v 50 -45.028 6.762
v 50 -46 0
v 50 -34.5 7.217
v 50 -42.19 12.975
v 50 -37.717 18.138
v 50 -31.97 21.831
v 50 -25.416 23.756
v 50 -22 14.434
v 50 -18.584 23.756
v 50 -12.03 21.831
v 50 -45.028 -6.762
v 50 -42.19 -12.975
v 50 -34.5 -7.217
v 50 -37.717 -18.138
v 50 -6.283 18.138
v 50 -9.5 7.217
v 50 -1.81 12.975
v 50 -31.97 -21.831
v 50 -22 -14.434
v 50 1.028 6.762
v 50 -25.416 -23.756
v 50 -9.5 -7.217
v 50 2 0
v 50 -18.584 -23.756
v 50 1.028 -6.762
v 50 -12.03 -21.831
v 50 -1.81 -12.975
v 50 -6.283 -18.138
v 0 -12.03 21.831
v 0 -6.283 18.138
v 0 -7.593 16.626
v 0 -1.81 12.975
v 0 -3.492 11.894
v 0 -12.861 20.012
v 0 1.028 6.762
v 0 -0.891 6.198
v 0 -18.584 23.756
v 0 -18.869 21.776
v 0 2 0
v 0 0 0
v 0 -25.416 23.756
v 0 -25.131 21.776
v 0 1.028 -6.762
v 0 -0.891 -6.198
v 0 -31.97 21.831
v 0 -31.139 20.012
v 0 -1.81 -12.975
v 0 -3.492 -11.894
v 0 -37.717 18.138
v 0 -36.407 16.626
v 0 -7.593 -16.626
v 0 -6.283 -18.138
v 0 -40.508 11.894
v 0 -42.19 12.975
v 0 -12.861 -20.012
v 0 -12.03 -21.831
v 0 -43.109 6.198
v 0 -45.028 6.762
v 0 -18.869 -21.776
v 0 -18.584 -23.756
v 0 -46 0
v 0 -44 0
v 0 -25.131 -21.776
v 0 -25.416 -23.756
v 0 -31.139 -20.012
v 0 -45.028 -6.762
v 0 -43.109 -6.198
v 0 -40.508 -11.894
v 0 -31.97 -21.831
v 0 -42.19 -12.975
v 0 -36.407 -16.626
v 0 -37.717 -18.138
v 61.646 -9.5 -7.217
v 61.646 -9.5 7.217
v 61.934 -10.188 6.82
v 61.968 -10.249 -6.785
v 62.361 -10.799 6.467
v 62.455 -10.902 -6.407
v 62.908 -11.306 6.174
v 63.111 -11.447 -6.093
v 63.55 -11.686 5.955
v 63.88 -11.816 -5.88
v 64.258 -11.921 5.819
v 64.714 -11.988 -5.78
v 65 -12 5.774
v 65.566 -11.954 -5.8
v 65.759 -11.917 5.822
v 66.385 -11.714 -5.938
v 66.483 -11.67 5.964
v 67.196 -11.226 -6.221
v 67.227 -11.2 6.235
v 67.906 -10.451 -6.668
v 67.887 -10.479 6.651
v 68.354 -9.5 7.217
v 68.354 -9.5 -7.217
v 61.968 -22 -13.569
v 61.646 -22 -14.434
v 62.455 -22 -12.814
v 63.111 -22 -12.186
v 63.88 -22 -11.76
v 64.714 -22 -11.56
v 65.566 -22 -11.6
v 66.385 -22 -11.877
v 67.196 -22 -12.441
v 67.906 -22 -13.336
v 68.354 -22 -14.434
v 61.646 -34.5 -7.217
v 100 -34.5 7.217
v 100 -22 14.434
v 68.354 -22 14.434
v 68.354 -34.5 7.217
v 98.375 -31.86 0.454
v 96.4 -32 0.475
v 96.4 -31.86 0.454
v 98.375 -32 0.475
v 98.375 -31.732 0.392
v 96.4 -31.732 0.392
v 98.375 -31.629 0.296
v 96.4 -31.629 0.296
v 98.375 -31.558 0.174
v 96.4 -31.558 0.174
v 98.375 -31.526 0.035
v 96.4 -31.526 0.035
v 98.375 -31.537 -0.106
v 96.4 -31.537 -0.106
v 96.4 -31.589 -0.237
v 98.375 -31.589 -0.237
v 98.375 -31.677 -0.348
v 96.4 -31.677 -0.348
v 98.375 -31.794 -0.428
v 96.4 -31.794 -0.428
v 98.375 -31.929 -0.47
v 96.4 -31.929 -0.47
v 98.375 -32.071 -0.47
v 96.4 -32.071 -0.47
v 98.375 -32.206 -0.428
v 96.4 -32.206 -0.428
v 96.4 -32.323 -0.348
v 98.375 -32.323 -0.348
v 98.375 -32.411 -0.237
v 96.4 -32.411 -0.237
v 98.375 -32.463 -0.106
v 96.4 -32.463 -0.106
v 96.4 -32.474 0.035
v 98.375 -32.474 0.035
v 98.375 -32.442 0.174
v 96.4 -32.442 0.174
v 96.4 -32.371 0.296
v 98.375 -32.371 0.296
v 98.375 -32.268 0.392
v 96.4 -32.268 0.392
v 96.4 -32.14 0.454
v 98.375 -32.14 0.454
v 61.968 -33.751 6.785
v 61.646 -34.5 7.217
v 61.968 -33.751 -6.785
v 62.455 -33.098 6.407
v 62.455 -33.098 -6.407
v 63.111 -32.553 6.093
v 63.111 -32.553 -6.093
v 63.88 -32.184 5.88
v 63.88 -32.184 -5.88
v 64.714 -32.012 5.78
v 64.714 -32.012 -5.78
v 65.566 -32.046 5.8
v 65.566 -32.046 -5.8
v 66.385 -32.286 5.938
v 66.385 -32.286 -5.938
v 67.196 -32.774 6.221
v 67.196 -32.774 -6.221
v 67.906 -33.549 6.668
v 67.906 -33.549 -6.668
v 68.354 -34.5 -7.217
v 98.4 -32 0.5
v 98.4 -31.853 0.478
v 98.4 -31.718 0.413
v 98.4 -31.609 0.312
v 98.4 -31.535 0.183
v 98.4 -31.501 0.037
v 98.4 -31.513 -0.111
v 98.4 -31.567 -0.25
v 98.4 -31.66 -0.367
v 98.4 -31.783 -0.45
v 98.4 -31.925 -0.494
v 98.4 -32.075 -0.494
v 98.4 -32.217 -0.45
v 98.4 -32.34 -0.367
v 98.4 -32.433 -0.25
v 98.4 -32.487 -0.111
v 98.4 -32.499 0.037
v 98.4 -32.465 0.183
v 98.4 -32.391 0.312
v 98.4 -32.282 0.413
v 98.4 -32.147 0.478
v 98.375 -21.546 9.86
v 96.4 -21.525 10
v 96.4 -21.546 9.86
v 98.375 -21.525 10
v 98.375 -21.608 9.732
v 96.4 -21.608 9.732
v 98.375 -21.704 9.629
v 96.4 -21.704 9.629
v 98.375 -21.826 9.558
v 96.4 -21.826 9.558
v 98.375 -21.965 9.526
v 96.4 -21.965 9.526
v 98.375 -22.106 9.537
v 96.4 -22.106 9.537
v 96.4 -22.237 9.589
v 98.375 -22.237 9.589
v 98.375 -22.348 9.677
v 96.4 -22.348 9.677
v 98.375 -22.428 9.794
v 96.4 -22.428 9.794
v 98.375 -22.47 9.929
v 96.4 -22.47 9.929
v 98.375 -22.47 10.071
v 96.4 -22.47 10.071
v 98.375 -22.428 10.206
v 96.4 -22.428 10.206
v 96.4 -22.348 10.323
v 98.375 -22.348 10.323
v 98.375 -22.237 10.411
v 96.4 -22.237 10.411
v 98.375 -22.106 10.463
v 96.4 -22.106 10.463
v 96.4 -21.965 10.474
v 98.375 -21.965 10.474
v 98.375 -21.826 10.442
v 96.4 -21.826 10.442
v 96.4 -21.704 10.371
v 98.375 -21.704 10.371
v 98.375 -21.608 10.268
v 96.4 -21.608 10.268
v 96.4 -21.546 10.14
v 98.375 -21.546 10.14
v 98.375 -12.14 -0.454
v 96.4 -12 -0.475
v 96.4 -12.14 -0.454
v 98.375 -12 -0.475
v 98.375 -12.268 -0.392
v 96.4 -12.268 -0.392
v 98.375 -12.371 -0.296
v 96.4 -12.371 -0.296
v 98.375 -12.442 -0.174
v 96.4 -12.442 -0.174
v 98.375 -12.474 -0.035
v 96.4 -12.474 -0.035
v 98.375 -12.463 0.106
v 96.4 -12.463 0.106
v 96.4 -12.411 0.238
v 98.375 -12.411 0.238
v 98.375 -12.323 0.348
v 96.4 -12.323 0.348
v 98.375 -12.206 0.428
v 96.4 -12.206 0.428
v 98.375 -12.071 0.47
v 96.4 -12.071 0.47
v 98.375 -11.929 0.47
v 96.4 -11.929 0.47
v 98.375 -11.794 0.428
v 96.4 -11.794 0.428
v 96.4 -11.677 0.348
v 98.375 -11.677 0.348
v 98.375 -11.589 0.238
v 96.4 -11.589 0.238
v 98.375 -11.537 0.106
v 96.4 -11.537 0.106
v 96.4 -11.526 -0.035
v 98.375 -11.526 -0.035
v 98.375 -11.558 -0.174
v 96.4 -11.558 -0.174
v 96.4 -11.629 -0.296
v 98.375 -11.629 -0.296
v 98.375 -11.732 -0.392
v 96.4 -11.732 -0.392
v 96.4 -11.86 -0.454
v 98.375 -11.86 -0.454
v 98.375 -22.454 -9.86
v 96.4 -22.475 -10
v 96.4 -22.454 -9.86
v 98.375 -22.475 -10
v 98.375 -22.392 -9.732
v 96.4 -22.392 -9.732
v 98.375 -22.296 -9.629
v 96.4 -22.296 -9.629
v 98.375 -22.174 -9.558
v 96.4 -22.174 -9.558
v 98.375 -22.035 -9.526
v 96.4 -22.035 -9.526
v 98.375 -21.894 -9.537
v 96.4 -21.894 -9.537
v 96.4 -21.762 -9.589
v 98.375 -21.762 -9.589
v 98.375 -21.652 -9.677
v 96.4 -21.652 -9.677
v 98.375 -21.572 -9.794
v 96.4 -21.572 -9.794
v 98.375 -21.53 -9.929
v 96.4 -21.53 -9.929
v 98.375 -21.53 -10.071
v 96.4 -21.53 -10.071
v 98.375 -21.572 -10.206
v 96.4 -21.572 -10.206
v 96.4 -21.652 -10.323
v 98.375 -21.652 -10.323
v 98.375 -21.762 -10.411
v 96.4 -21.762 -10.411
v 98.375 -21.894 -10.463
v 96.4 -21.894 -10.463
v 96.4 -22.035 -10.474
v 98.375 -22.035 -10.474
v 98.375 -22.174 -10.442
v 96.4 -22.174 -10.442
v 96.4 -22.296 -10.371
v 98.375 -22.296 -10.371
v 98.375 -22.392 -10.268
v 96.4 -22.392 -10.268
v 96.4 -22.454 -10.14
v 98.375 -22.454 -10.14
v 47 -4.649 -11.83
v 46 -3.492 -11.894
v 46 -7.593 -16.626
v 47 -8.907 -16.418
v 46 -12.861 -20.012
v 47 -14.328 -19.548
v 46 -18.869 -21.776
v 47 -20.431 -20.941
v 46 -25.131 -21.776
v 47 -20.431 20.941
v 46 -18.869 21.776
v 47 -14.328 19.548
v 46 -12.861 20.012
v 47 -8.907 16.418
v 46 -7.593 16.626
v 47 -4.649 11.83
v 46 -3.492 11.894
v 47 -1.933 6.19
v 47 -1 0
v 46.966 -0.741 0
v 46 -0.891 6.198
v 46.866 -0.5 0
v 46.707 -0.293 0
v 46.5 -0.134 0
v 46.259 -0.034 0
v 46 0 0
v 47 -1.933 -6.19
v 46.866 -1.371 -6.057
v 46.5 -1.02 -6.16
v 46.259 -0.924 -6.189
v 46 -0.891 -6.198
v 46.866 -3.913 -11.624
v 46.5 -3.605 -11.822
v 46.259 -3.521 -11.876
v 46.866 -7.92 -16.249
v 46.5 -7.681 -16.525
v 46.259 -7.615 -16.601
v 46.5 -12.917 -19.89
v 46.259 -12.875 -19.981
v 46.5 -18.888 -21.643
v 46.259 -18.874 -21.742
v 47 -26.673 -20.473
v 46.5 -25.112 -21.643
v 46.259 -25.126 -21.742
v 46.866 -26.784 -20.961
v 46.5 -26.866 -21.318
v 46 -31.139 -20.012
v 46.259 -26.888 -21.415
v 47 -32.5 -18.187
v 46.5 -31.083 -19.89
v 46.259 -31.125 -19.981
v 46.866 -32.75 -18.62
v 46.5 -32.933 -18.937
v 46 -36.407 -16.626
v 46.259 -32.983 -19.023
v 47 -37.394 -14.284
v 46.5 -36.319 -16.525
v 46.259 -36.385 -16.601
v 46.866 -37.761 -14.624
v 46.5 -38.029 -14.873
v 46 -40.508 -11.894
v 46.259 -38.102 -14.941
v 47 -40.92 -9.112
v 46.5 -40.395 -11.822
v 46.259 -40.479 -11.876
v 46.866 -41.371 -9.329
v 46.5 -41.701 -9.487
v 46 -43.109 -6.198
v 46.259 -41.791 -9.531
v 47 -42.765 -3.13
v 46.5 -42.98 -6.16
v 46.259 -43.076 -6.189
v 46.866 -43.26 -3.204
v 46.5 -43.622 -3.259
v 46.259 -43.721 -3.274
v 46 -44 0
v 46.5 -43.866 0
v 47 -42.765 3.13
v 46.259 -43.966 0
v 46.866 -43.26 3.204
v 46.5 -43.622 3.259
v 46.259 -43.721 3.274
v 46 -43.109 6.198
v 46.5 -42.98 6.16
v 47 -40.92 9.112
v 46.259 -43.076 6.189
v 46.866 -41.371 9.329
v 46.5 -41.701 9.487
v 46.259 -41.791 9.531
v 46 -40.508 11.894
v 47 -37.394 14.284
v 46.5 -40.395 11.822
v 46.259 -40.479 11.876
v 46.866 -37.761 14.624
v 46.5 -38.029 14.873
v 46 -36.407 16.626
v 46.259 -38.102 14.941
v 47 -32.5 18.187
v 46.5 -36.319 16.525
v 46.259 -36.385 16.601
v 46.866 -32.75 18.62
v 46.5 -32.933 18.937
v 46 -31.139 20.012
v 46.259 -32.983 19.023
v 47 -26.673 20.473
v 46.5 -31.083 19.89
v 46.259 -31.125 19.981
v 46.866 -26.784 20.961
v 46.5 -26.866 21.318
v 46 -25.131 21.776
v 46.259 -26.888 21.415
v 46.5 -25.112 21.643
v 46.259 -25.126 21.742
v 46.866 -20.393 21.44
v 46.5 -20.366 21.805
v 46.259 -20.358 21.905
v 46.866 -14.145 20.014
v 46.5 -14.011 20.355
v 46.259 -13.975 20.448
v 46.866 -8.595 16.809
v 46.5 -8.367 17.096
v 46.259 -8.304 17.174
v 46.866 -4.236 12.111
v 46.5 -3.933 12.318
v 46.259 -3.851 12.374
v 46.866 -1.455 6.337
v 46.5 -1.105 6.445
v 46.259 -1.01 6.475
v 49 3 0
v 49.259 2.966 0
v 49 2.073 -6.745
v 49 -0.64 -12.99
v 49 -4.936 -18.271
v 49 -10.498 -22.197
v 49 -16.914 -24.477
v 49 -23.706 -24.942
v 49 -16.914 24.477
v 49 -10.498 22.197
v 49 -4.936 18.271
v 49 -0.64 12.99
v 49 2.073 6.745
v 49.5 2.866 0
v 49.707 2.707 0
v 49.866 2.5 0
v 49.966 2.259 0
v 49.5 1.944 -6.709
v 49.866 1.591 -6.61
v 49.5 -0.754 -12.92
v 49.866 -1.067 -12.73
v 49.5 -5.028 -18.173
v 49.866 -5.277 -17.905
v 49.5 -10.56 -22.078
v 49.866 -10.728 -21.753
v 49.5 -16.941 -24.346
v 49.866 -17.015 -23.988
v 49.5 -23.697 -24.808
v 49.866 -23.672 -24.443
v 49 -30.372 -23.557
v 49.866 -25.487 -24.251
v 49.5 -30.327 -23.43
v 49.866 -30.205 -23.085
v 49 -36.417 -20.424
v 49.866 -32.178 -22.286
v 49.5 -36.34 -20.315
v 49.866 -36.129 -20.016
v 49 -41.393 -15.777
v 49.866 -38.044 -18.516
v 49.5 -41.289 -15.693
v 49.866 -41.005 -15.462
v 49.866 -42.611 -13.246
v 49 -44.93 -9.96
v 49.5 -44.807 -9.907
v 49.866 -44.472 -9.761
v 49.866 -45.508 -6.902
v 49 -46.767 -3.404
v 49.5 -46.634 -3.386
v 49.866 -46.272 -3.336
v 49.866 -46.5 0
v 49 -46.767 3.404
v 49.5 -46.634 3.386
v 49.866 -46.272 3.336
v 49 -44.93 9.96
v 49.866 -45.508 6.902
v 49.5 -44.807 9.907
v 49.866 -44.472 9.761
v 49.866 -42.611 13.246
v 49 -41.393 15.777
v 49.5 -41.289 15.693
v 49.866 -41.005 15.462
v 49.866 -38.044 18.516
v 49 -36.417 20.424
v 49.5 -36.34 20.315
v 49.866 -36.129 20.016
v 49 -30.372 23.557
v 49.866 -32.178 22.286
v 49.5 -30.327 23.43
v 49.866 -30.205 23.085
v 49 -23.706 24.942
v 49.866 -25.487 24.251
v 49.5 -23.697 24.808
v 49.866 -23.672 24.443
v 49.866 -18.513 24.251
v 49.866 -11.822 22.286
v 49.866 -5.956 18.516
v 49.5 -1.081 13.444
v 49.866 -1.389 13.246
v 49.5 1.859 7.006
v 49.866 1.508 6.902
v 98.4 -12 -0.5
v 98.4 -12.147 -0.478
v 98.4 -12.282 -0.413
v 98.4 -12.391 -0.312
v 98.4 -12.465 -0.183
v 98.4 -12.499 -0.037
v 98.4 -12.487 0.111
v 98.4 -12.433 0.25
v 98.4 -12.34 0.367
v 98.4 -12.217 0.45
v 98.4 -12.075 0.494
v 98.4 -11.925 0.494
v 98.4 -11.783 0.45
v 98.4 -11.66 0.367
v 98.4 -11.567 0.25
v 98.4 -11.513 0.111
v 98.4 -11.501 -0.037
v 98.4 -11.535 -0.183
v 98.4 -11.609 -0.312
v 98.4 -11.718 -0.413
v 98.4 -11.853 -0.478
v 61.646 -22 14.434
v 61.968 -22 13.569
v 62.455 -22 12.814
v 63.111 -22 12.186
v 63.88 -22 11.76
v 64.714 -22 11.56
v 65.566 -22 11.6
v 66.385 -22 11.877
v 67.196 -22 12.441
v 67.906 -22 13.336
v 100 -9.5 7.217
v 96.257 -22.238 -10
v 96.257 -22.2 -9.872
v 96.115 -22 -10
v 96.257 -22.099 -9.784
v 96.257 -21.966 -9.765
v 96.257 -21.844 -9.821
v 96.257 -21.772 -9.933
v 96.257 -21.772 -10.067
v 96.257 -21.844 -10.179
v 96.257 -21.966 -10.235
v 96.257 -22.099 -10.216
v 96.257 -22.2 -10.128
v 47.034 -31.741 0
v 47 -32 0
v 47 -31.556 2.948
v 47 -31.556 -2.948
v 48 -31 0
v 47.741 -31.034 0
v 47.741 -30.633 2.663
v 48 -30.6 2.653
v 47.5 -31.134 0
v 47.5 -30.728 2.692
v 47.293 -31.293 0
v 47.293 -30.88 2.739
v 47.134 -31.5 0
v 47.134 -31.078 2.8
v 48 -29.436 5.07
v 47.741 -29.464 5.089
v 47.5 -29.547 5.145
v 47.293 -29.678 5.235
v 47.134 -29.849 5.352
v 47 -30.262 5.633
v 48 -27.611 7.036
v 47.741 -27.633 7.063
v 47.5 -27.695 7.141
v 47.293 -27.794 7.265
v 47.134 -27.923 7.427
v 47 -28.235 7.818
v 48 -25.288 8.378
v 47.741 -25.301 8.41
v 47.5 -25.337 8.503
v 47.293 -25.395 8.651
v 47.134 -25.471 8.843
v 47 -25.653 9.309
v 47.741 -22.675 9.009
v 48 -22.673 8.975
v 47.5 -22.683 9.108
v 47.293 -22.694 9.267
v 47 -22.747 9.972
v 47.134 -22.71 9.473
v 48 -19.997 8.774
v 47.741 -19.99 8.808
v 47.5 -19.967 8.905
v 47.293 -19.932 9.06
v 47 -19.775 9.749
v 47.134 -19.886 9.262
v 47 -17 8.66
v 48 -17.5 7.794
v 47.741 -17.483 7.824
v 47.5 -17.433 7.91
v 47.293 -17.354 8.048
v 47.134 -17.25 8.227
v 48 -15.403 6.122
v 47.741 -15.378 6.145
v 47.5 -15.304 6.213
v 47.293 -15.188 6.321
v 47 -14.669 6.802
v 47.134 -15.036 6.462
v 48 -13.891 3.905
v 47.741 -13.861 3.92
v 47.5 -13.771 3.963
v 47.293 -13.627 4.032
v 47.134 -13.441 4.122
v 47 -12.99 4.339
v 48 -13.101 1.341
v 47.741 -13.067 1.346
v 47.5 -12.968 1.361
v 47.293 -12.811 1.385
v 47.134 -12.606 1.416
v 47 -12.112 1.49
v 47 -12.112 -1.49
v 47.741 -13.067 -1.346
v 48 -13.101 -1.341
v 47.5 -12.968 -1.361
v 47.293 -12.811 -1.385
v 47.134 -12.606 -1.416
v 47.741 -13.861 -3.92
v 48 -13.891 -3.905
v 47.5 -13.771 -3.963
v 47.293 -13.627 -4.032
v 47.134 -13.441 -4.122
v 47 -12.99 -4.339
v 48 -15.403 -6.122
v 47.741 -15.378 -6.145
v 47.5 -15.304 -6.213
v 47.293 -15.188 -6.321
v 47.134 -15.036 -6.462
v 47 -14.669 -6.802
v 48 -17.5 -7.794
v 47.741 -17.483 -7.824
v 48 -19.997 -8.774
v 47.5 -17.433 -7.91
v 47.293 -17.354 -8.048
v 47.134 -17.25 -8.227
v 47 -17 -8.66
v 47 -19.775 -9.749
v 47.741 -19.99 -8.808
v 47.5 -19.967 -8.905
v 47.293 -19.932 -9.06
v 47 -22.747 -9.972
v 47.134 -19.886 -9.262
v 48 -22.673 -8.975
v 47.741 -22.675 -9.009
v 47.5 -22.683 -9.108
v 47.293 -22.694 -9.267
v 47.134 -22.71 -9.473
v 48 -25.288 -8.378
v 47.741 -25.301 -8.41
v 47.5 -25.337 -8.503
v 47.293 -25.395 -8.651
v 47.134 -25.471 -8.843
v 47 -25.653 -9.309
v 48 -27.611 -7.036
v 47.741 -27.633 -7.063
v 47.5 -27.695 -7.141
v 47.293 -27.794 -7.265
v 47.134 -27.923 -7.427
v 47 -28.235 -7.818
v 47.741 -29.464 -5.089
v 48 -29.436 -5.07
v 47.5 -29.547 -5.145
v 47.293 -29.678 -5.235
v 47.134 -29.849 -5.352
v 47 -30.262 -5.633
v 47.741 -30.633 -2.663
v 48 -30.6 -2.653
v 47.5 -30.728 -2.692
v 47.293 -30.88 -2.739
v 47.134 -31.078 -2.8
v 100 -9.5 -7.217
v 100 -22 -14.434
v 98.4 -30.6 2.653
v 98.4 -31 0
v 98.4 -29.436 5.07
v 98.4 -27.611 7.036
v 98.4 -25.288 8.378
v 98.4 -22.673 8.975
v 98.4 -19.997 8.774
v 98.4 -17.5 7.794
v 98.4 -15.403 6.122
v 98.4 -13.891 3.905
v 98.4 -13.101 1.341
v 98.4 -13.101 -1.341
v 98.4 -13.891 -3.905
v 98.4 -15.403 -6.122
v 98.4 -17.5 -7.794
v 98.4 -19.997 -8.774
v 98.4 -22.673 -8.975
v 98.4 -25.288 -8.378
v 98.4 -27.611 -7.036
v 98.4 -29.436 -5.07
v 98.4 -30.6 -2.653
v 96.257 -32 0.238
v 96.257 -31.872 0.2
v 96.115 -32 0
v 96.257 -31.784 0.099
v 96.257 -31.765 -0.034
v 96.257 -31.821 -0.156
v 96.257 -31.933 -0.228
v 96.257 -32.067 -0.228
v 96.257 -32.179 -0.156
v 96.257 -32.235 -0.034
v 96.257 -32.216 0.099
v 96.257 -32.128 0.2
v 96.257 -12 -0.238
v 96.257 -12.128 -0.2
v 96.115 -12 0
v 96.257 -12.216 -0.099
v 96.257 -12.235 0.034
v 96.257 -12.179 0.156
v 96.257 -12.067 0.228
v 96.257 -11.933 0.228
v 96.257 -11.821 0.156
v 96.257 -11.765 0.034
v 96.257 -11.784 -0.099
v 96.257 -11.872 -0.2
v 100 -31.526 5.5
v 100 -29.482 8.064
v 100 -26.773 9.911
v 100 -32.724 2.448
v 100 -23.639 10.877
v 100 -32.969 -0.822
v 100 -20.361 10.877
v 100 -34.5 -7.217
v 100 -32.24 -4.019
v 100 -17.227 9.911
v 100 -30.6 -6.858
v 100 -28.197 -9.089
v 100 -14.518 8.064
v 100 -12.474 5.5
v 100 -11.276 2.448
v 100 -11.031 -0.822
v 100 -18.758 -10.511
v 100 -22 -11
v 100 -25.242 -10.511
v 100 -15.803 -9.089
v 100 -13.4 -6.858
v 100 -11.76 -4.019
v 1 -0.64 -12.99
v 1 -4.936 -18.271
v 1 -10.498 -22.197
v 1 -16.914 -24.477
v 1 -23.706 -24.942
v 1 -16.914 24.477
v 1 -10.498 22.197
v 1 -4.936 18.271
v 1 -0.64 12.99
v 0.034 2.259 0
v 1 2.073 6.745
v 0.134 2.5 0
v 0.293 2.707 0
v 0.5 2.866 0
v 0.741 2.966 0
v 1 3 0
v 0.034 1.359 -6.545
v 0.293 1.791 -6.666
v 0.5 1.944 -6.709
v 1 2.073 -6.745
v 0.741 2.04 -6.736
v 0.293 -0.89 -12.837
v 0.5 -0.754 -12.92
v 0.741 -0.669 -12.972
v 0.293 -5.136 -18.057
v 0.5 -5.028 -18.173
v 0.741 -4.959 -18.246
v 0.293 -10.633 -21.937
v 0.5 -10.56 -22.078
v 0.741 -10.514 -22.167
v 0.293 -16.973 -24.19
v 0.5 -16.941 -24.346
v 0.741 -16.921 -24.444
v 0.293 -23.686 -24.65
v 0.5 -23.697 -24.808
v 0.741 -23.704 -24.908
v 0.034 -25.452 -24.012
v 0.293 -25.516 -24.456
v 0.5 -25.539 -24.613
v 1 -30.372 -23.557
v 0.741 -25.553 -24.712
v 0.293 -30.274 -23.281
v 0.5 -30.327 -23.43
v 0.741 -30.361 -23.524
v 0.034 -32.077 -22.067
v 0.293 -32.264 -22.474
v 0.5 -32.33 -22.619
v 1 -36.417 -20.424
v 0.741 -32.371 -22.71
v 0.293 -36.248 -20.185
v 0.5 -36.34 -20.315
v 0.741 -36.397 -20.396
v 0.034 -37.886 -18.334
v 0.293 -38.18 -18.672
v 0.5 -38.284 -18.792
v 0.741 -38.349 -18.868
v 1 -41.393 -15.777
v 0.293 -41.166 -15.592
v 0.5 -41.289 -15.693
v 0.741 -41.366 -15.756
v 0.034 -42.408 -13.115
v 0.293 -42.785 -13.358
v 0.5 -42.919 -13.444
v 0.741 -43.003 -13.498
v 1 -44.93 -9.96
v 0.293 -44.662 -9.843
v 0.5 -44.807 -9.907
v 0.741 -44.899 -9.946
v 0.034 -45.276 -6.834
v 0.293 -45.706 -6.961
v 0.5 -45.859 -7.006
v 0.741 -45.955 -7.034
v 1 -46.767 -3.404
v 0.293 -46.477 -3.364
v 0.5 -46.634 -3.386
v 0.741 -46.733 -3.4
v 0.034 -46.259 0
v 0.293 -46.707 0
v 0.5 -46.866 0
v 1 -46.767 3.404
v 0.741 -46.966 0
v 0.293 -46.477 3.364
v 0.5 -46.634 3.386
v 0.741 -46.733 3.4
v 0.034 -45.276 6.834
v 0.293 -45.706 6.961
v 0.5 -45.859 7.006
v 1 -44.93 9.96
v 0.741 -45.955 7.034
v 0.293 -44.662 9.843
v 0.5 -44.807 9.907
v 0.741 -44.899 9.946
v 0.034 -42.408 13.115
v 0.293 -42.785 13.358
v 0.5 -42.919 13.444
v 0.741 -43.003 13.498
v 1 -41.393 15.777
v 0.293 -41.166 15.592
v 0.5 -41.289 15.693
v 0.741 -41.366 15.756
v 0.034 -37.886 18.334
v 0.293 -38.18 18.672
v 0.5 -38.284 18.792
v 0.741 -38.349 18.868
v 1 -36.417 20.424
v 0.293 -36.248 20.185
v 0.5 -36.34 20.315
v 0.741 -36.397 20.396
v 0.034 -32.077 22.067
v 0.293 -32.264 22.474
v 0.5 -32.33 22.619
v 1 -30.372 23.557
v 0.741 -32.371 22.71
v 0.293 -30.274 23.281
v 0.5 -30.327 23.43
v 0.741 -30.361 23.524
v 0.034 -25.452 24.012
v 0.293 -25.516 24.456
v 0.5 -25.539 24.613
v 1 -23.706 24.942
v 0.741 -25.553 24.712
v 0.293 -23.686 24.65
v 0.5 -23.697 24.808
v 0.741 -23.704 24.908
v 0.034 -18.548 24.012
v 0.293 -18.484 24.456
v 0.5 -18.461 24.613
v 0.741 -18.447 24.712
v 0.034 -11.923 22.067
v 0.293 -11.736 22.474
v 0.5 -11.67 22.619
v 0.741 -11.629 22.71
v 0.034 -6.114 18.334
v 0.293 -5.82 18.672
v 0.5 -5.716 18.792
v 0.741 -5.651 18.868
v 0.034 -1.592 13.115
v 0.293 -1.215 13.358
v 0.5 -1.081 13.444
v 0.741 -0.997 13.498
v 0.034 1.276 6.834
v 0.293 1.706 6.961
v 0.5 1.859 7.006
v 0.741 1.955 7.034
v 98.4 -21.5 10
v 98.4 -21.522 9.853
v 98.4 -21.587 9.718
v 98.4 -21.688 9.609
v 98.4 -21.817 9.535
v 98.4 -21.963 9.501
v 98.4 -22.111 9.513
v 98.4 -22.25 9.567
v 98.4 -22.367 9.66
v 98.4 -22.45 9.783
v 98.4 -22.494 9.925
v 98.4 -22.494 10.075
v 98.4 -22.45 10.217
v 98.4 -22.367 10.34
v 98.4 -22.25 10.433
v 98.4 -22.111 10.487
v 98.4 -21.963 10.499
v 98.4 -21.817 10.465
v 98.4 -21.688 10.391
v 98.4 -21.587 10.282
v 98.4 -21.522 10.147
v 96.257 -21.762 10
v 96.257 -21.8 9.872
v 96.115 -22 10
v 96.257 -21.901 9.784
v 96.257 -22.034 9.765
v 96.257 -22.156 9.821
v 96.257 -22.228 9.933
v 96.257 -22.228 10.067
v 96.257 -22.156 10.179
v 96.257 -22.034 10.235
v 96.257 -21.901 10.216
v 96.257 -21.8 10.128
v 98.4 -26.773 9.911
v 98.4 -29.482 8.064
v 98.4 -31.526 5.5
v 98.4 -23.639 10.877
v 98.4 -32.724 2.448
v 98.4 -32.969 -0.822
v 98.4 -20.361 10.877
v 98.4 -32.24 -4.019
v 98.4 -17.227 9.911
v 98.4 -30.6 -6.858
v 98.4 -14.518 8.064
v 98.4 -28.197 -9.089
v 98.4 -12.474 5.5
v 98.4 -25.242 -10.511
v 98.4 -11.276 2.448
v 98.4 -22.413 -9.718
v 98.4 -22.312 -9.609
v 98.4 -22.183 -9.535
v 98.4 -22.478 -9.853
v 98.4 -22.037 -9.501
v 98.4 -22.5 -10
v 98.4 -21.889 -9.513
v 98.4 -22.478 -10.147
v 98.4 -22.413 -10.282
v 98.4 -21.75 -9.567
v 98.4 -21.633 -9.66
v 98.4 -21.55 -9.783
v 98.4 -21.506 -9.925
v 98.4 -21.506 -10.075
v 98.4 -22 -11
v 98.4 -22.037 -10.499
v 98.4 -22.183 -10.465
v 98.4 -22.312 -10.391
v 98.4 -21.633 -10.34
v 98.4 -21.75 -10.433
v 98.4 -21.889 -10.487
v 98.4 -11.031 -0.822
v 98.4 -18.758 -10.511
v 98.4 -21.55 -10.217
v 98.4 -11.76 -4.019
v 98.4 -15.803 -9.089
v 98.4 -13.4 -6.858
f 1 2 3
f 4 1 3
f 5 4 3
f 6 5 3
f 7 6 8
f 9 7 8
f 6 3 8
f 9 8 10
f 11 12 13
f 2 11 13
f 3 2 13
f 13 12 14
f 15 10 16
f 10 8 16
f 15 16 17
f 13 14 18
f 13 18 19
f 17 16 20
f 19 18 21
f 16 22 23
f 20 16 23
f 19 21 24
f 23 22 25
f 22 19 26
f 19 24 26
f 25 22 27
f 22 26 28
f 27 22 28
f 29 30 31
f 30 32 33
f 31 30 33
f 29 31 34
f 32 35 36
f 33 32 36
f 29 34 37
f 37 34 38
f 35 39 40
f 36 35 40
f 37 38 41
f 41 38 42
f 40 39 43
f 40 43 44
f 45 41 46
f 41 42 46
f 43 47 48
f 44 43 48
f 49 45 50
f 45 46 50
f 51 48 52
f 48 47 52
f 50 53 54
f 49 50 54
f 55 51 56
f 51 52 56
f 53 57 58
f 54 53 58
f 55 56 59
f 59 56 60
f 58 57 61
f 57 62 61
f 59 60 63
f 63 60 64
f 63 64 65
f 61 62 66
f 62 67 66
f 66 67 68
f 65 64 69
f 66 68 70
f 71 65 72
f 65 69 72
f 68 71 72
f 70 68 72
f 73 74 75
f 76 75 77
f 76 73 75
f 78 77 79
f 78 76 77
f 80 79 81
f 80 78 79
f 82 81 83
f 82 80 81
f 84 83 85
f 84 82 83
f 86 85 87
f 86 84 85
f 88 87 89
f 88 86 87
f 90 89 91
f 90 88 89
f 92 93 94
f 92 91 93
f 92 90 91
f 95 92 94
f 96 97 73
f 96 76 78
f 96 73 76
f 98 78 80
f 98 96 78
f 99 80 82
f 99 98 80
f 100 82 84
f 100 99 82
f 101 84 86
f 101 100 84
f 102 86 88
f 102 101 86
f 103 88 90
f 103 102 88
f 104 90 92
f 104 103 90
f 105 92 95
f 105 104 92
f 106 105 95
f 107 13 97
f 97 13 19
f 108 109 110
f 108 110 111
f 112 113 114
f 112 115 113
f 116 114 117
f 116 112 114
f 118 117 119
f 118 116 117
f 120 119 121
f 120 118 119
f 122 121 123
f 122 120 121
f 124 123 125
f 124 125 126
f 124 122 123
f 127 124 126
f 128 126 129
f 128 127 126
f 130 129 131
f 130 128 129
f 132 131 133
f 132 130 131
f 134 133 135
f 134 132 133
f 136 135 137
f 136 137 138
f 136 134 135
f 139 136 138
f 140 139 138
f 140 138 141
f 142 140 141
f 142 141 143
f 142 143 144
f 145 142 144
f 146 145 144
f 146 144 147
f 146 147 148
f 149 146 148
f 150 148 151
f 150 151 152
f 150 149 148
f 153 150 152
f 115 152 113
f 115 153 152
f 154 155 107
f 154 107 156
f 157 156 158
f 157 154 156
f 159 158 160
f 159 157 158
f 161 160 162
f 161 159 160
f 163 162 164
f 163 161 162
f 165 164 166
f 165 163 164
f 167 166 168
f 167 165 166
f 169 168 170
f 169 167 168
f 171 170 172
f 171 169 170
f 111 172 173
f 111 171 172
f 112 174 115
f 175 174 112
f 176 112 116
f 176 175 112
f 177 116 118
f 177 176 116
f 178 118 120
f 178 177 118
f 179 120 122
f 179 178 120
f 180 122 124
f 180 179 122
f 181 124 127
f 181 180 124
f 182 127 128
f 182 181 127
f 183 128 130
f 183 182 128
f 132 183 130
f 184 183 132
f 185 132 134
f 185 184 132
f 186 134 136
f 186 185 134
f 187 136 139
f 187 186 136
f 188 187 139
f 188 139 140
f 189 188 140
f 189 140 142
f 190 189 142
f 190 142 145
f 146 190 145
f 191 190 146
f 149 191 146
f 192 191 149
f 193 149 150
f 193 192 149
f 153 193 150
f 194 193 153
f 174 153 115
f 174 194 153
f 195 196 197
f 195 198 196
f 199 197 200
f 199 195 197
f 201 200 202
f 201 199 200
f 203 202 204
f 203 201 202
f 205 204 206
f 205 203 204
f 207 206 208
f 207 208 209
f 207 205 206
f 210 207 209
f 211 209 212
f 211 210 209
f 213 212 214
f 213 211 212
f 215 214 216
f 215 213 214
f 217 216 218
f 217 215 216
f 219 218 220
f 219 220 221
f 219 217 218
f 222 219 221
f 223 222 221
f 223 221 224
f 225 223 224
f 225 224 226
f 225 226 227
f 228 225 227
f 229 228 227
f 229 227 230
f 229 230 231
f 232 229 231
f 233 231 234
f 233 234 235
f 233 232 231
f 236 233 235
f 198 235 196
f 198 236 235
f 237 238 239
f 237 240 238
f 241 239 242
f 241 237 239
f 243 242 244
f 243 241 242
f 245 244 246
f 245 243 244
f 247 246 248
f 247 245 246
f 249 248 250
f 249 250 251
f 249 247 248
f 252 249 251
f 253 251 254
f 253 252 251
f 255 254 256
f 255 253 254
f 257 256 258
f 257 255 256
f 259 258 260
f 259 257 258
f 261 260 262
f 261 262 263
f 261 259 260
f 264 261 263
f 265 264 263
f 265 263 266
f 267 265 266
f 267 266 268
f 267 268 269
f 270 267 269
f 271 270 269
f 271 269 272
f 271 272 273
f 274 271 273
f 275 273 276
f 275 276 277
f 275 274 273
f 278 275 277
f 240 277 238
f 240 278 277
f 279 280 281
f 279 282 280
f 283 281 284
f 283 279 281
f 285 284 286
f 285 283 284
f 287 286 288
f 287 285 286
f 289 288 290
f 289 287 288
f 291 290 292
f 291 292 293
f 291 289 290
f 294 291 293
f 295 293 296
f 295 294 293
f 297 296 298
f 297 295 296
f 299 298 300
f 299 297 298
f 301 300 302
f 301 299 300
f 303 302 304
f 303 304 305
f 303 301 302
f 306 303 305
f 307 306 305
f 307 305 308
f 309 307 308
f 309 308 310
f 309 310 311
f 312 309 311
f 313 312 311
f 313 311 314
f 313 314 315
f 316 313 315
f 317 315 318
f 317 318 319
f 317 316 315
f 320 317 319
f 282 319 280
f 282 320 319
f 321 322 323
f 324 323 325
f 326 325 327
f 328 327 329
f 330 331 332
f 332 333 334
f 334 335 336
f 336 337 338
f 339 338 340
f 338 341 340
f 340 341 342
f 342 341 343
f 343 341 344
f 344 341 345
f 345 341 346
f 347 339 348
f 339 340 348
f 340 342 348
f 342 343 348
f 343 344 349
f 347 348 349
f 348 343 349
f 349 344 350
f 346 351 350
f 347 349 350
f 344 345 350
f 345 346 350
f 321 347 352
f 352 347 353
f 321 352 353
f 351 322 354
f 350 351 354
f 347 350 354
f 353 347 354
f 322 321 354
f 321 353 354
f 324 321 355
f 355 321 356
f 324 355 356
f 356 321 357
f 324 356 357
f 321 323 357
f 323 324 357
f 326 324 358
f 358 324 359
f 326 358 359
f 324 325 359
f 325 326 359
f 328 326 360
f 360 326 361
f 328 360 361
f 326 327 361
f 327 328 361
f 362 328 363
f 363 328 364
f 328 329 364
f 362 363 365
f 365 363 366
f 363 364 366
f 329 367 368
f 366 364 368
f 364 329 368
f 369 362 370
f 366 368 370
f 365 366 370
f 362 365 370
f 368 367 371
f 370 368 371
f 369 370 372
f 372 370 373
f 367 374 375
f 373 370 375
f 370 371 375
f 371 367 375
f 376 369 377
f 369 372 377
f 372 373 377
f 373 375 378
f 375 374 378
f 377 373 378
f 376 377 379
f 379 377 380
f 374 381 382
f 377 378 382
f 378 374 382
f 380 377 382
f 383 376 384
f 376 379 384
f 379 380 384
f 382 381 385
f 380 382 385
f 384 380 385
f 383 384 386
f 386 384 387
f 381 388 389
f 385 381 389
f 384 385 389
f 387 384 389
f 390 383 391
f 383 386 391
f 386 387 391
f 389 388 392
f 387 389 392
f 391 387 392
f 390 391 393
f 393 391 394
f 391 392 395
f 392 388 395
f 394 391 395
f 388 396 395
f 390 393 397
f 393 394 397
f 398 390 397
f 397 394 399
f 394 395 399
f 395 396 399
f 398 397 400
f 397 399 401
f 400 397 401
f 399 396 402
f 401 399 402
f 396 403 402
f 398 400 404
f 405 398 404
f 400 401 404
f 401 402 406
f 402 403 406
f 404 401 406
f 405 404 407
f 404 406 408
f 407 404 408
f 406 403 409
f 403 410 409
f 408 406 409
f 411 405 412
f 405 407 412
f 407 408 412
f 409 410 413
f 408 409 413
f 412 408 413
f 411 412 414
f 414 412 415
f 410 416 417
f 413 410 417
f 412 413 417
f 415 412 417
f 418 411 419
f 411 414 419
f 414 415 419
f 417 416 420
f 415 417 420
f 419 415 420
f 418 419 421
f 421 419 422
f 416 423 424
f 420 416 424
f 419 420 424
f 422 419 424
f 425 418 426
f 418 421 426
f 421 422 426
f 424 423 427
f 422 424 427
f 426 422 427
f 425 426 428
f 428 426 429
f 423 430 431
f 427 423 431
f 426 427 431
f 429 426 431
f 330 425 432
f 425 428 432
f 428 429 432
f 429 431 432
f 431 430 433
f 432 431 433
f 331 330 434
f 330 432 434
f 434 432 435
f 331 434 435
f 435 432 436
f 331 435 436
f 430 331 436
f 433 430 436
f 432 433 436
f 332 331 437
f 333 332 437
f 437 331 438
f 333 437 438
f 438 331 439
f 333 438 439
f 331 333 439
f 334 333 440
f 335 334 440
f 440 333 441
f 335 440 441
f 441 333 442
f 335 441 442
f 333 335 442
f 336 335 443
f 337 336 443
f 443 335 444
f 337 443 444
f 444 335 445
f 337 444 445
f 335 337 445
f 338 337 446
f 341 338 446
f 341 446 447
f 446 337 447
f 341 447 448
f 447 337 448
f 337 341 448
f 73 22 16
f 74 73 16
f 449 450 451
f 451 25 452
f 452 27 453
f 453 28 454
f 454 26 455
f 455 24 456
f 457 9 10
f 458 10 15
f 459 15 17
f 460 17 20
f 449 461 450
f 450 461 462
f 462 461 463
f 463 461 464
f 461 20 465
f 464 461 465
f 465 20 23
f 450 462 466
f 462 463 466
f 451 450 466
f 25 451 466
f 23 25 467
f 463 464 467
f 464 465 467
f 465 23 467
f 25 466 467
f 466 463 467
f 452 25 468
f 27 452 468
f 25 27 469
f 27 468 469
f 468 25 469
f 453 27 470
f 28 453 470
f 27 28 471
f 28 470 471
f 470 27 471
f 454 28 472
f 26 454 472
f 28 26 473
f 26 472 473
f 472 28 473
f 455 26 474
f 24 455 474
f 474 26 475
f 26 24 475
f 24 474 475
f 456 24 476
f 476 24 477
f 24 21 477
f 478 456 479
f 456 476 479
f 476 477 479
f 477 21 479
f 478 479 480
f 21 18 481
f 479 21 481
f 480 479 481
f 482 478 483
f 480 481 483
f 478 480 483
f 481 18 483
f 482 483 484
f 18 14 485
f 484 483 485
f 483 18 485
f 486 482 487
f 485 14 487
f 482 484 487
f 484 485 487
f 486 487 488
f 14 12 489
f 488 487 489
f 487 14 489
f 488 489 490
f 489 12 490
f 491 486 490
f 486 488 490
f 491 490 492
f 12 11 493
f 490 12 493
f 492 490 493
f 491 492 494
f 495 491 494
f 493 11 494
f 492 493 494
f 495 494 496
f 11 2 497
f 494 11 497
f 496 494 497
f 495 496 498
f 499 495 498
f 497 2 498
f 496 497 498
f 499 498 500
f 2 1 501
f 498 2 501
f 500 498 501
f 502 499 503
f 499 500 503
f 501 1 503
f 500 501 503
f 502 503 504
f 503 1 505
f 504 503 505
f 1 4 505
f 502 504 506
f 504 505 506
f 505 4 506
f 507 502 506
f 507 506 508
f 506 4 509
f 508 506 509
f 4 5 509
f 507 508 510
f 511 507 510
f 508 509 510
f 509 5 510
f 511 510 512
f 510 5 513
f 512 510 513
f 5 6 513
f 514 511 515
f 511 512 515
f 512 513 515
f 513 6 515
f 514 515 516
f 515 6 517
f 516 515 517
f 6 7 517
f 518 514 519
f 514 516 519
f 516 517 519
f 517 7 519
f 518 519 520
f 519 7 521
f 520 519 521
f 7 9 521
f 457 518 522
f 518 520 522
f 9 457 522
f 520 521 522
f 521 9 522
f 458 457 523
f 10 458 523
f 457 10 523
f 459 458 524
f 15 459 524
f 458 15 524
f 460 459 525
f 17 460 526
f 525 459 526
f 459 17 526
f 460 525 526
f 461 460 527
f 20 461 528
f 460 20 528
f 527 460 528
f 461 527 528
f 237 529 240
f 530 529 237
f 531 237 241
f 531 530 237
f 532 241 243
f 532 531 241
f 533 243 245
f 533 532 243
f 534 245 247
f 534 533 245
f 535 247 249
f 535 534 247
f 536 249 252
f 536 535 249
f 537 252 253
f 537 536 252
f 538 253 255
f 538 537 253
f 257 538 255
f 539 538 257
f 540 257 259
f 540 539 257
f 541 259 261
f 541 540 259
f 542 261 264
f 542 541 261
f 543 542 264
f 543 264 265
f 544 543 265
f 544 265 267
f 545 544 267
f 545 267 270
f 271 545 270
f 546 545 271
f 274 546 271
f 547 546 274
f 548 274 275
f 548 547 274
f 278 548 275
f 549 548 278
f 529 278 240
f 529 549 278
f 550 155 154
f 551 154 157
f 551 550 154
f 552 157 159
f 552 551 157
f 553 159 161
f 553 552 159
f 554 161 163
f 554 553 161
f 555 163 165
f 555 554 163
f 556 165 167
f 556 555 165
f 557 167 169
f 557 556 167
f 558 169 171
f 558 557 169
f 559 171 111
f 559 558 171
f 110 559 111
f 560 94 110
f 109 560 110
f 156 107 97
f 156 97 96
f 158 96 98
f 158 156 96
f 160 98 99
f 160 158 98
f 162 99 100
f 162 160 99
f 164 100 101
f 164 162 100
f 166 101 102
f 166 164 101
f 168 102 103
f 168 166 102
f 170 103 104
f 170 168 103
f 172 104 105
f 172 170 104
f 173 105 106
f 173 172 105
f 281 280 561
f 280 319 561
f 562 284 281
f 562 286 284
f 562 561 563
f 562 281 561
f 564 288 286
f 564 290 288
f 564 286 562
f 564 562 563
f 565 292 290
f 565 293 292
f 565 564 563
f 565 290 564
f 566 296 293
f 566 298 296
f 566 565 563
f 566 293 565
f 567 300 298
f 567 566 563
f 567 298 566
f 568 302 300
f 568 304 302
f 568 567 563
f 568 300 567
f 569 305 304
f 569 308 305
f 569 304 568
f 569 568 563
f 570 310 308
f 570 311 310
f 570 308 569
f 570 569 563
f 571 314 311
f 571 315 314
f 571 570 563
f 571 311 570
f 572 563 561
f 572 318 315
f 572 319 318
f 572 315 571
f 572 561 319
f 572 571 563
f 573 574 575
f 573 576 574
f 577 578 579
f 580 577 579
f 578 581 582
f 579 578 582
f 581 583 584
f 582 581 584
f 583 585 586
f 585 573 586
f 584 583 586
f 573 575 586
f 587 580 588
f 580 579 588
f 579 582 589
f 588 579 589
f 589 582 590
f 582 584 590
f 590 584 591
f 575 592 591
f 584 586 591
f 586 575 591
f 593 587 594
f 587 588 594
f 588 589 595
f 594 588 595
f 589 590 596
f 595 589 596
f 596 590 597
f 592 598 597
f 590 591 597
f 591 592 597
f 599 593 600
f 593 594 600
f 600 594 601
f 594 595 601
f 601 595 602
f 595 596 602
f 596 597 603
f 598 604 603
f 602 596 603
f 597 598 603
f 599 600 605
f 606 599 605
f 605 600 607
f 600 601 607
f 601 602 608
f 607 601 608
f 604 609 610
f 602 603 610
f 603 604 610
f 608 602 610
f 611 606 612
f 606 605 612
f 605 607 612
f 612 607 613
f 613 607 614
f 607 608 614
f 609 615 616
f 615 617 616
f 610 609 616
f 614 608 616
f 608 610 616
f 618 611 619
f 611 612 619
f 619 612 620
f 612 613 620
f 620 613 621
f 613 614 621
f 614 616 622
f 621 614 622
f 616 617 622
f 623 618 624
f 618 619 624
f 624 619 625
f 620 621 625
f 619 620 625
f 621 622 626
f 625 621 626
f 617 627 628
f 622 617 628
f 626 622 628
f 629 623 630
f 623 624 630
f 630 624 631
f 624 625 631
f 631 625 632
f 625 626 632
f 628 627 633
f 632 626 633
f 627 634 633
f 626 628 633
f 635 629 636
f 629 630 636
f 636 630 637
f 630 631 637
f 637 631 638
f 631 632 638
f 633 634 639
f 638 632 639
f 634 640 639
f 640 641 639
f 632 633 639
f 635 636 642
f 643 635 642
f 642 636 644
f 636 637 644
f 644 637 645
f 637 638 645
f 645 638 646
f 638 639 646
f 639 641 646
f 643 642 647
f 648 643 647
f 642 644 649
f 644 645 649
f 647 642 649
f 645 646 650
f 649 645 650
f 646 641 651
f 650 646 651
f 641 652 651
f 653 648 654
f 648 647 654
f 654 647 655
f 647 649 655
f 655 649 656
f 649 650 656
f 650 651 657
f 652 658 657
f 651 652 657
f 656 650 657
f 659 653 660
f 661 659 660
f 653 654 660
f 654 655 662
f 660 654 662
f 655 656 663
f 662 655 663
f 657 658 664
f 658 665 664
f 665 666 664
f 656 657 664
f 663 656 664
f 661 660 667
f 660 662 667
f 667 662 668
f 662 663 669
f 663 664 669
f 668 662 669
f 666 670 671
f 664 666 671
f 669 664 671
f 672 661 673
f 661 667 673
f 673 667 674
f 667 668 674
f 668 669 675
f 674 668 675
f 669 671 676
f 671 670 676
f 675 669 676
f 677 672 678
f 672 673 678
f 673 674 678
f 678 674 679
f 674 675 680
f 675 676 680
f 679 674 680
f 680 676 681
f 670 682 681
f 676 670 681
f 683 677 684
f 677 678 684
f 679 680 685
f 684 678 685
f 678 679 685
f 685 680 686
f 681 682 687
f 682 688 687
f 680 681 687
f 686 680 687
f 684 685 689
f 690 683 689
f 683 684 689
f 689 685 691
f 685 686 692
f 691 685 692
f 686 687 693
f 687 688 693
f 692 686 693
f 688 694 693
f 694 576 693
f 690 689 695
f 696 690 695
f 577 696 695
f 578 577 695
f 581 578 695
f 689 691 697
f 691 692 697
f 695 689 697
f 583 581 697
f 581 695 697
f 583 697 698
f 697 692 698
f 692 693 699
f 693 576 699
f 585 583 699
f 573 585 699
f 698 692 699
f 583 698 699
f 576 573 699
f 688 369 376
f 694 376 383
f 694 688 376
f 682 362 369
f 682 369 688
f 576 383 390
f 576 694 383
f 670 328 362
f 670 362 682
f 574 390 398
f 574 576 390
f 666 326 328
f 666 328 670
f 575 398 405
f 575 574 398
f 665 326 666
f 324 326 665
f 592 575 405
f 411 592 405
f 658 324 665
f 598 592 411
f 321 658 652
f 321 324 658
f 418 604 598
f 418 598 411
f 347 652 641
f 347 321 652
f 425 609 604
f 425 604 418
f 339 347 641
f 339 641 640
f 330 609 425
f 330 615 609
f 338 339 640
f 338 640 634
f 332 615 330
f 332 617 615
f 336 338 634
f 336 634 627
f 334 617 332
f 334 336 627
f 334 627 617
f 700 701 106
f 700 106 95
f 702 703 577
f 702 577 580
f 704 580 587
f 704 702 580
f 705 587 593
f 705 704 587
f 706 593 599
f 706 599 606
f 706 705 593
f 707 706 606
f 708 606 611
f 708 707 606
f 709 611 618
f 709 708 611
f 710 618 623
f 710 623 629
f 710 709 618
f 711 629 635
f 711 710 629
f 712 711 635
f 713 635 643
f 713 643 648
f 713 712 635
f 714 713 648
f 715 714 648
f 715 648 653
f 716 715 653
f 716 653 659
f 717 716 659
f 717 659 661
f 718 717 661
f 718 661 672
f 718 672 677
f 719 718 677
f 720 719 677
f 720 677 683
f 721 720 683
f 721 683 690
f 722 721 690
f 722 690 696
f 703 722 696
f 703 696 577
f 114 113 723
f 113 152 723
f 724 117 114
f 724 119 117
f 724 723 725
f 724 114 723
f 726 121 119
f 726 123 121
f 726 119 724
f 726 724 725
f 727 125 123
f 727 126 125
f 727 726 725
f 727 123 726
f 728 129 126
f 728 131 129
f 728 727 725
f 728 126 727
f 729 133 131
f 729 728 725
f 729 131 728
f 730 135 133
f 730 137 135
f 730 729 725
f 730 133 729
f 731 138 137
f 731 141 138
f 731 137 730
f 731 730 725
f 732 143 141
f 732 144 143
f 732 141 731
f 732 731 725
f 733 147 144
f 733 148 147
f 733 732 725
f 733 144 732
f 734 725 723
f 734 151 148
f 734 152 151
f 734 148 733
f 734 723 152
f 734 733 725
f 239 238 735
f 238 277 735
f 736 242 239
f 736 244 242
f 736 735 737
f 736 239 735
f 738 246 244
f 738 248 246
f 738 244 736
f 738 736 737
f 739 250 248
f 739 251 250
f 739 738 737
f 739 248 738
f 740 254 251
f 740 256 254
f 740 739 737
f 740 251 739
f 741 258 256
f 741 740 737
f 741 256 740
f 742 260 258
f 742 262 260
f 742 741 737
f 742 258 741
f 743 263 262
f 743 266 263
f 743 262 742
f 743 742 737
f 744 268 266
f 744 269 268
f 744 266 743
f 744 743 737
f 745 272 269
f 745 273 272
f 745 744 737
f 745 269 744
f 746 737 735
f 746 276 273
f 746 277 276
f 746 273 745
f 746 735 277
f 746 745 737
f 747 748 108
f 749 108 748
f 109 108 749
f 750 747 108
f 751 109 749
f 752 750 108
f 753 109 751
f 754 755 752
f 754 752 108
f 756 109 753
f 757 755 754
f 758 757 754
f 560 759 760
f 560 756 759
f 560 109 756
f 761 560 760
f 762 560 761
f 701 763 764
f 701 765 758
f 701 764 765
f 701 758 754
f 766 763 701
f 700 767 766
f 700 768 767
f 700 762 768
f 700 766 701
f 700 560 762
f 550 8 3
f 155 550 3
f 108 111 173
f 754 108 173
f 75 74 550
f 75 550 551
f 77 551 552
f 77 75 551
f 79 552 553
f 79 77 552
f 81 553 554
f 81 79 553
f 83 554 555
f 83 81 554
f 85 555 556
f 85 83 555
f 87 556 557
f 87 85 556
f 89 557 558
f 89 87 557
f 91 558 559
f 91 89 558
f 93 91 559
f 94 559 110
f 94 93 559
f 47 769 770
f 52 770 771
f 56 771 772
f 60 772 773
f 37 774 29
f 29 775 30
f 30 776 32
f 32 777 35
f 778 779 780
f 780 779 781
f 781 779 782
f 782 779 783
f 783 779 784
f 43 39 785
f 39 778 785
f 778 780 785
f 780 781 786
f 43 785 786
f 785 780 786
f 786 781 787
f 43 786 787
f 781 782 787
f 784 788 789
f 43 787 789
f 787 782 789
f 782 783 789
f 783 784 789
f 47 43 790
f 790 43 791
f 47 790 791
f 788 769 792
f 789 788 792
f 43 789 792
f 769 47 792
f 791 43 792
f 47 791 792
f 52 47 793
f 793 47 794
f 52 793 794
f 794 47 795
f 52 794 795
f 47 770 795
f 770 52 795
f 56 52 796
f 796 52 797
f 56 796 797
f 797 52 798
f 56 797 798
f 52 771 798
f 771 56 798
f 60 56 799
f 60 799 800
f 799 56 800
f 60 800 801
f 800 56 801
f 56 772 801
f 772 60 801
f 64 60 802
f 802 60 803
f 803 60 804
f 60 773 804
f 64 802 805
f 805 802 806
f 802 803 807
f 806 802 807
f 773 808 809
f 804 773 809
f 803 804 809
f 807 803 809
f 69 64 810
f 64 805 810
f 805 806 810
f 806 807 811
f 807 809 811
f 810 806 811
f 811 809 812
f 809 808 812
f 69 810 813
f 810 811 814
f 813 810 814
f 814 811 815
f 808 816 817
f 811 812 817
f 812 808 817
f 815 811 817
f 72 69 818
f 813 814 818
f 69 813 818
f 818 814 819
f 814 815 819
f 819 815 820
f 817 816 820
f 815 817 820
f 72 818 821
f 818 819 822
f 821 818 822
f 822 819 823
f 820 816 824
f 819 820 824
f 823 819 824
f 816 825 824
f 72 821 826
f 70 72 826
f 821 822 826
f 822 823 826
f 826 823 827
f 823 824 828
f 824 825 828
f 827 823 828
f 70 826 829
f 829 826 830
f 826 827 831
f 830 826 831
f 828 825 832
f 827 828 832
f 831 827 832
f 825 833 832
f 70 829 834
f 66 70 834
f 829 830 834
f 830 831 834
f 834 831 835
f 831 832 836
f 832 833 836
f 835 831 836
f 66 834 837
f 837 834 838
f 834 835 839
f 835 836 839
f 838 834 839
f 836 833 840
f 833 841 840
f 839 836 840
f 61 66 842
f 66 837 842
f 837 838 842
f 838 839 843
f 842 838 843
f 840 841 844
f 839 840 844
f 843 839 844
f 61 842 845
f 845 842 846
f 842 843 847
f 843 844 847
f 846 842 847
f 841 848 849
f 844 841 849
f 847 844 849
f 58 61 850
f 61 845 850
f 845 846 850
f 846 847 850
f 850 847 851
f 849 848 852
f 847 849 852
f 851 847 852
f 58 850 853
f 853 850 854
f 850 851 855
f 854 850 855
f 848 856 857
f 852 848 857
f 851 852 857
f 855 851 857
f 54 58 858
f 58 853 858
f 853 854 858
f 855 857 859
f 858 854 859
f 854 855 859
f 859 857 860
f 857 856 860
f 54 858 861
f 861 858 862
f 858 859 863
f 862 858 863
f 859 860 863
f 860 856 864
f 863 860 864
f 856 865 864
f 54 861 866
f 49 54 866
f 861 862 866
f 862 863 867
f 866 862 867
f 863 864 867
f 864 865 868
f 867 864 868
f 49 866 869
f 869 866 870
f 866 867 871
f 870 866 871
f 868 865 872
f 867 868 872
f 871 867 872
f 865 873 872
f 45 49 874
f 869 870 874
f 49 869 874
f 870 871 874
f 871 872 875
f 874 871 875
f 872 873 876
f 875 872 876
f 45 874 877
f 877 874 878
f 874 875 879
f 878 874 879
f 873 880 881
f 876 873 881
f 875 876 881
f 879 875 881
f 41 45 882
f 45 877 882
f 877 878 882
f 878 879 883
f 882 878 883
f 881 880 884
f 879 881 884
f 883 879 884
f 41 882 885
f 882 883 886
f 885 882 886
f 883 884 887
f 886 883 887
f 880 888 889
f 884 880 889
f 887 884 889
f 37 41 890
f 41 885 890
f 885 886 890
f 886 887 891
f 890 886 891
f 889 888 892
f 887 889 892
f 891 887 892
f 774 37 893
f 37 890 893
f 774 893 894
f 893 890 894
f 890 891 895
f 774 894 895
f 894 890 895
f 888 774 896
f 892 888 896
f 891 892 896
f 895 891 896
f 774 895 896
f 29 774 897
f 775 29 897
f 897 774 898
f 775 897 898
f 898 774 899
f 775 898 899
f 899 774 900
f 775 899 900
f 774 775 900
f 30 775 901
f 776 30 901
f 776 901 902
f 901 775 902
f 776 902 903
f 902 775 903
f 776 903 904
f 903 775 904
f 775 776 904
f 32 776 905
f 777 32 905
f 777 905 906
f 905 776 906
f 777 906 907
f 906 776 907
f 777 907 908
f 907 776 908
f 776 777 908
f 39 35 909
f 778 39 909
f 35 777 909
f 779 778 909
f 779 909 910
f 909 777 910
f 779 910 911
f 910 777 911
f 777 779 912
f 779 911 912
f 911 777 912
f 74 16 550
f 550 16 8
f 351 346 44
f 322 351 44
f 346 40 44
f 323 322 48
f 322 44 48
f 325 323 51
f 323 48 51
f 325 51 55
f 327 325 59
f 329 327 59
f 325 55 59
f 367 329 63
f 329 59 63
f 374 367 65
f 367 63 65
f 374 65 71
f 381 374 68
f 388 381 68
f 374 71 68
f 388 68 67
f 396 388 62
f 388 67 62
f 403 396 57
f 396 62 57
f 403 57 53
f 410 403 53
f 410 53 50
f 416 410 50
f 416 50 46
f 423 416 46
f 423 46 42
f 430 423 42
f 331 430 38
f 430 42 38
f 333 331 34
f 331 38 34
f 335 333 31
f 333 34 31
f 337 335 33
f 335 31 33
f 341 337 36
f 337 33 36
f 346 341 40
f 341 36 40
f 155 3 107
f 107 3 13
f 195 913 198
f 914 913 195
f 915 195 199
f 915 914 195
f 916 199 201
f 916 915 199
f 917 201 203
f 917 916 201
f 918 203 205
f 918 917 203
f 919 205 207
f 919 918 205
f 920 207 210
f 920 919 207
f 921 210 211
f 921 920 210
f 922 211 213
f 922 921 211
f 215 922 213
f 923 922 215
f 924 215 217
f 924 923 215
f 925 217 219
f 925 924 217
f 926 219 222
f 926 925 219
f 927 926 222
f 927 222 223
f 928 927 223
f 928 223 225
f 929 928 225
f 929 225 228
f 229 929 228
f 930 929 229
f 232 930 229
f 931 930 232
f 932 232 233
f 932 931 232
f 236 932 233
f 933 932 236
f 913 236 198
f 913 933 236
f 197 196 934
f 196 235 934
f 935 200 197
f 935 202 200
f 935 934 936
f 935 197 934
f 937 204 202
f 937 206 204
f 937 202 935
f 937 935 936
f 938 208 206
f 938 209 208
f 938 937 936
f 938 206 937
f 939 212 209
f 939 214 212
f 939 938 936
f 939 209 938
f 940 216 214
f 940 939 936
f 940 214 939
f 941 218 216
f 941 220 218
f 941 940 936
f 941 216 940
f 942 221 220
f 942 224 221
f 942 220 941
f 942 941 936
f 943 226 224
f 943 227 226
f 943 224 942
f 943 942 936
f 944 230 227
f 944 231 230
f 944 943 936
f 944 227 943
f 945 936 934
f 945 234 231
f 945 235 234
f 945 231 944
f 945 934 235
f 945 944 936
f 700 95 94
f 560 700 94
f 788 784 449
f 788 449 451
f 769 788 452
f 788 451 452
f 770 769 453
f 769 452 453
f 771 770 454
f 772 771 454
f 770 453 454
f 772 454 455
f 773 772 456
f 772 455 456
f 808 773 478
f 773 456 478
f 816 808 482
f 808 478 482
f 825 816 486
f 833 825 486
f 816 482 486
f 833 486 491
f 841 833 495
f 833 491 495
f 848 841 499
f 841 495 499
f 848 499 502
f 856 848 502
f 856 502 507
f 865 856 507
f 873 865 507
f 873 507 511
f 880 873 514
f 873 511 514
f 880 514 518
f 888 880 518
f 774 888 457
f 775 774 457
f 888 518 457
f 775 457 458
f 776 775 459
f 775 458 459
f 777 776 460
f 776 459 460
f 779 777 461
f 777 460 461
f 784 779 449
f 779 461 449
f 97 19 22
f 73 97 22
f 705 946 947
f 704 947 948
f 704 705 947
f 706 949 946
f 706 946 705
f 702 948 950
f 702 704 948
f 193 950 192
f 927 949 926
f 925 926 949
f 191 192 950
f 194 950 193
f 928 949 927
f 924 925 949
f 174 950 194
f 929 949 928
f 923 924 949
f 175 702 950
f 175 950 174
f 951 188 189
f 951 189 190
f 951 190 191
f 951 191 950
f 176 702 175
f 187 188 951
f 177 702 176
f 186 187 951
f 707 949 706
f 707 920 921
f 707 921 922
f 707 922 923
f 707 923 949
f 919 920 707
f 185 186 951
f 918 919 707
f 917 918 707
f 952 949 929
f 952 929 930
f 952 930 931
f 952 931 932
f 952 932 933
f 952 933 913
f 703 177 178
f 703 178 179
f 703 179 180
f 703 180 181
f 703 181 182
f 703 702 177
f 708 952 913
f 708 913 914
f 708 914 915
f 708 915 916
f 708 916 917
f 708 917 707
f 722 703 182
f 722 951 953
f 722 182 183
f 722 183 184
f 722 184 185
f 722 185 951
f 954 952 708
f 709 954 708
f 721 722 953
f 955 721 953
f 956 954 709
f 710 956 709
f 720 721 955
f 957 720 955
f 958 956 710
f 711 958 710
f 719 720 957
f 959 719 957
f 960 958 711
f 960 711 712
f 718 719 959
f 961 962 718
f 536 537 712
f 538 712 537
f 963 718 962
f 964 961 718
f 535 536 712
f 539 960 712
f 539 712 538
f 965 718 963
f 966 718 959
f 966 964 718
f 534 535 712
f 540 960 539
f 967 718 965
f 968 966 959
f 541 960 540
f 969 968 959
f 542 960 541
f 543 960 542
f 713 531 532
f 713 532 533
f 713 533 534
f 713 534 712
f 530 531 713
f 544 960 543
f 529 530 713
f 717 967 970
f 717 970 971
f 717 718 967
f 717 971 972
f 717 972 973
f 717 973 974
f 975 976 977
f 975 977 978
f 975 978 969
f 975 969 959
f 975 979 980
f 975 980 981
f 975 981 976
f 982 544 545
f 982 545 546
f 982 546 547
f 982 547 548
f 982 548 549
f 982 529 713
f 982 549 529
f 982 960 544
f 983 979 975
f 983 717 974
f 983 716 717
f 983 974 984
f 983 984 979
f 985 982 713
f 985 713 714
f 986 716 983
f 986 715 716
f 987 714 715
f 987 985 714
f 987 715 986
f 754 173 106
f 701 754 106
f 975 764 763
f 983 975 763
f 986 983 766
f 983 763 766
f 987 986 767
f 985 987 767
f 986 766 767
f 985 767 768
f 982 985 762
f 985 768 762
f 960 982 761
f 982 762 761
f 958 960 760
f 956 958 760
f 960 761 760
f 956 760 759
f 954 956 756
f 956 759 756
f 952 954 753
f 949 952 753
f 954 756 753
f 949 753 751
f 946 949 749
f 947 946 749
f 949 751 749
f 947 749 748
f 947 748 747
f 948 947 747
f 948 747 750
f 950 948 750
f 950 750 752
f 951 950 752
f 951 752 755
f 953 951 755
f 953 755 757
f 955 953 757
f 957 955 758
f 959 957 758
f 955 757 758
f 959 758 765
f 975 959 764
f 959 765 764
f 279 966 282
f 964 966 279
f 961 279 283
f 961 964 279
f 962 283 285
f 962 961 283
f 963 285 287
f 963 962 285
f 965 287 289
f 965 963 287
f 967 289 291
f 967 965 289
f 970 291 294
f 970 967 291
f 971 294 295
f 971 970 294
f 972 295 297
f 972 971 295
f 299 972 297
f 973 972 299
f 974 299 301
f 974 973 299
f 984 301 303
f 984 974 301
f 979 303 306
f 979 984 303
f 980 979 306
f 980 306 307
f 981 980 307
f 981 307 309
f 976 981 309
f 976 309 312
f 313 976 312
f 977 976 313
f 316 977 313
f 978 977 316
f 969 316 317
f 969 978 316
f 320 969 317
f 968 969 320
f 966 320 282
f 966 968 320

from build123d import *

# Parameters (mm, degrees)
BOSS_EXTRUDE3_DEPTH = 50
BOSS_EXTRUDE4_START = -53
SKETCH6_R           = 12.5
SKETCH6_R_2         = 9
BOSS_EXTRUDE4_DEPTH = 53
SKETCH3_W           = 3.5
SKETCH3_H           = 14.43375673
CIRPATTERN4_COUNT   = 6
FILLET1_R           = 1
SKETCH8_R           = 11
CUT_EXTRUDE1_DEPTH  = 1.6
CIRPATTERN5_COUNT   = 4


with BuildPart() as part:
    # Sketch1 → Revolve1 (revolve)
    with BuildSketch(Plane.XY):
        with BuildLine():
            ThreePointArc((0, 2), (0.292893219, 2.707106781), (1, 3))
            Line((1, 3), (49, 3))
            ThreePointArc((49, 3), (49.707106781, 2.707106781), (50, 2))
            Line((50, 2), (50, -12))
            Line((50, -12), (48, -12))
            ThreePointArc((48, -12), (47.292893219, -11.707106781), (47, -11))
            Line((47, -11), (47, -1))
            ThreePointArc((47, -1), (46.707106781, -0.292893219), (46, 0))
            Line((46, 0), (0, 0))
            Line((0, 0), (0, 2))
        make_face()
    revolve(axis=Axis((50, -22, 0), (-1, 0, 0)))

    # Sketch2 → Boss-Extrude3 (add)
    with BuildSketch(Plane(origin=(50, 0, 0), x_dir=(0, 0, -1), z_dir=(1, 0, 0))):
        Polygon((14.43375673, -22), (7.216878365, -9.5), (-7.216878365, -9.5), (-14.43375673, -22), (-7.216878365, -34.5), (7.216878365, -34.5), align=None)
        Polygon((11.547005384, -22), (5.773502692, -12), (-5.773502692, -12), (-11.547005384, -22), (-5.773502692, -32), (5.773502692, -32), align=None, mode=Mode.SUBTRACT)
    extrude(amount=BOSS_EXTRUDE3_DEPTH)

    # Sketch6 → Boss-Extrude4 (add)
    with BuildSketch(Plane.ZY.offset(-47).offset(BOSS_EXTRUDE4_START)):
        with Locations((0, -22)):
            Circle(SKETCH6_R)
        with Locations(Location((0, -22, 0), (0, 0, 270))):
            Circle(SKETCH6_R_2, mode=Mode.SUBTRACT)
    extrude(amount=BOSS_EXTRUDE4_DEPTH)

    # Sketch3 → Cut-Revolve3 (revolve, cut)
    with BuildSketch(Plane(origin=(0, -8.5, 0), x_dir=(1, 0, 0), z_dir=(0, 1, 0))):
        with Locations((66.75, 0)):
            Rectangle(SKETCH3_W, SKETCH3_H)
    cut_revolve3 = revolve(axis=Axis((65, -8.5, -7.216878365), (0, 0, 1)), mode=Mode.SUBTRACT)

    # CirPattern4: Cut-Revolve3 ×6 about axis
    cirpattern4_axis = Axis((0, -22, 0), (-1, 0, 0))
    for i in range(1, CIRPATTERN4_COUNT):
        add(cut_revolve3.rotate(cirpattern4_axis, i * 360 / CIRPATTERN4_COUNT), mode=Mode.SUBTRACT)

    # Fillet1
    fillet1_edges = [part.edges().sort_by_distance(p)[0] for p in [
        (47, -13, 0),
    ]]
    fillet(fillet1_edges, radius=FILLET1_R)

    # Sketch8 → Cut-Extrude1 (cut)
    with BuildSketch(Plane(origin=(100, 0, 0), x_dir=(0, 0, -1), z_dir=(1, 0, 0))):
        with Locations((0, -22)):
            Circle(SKETCH8_R)
    extrude(amount=-CUT_EXTRUDE1_DEPTH, mode=Mode.SUBTRACT)

    # Sketch10 → Tap Drill for M1.2x0.25 Tap1 (revolve, cut)
    with BuildSketch(Plane(origin=(98.4, -12, 0), x_dir=(0, 0, -1), z_dir=(0, 1, 0))):
        Polygon((0, 0), (0, 2.285408794), (0.475, 2), (0.475, 0.025), (0.5, 0), align=None)
    tap_drill_for_m1_2x0_25_tap1 = revolve(axis=Axis((104.75, -12, 0), (-1, 0, 0)), mode=Mode.SUBTRACT)

    # CirPattern5: Tap Drill for M1.2x0.25 Tap1 ×4 about axis
    cirpattern5_axis = Axis((0, -22, 0), (1, 0, 0))
    for i in range(1, CIRPATTERN5_COUNT):
        add(tap_drill_for_m1_2x0_25_tap1.rotate(cirpattern5_axis, i * 360 / CIRPATTERN5_COUNT), mode=Mode.SUBTRACT)


solid = part.part
